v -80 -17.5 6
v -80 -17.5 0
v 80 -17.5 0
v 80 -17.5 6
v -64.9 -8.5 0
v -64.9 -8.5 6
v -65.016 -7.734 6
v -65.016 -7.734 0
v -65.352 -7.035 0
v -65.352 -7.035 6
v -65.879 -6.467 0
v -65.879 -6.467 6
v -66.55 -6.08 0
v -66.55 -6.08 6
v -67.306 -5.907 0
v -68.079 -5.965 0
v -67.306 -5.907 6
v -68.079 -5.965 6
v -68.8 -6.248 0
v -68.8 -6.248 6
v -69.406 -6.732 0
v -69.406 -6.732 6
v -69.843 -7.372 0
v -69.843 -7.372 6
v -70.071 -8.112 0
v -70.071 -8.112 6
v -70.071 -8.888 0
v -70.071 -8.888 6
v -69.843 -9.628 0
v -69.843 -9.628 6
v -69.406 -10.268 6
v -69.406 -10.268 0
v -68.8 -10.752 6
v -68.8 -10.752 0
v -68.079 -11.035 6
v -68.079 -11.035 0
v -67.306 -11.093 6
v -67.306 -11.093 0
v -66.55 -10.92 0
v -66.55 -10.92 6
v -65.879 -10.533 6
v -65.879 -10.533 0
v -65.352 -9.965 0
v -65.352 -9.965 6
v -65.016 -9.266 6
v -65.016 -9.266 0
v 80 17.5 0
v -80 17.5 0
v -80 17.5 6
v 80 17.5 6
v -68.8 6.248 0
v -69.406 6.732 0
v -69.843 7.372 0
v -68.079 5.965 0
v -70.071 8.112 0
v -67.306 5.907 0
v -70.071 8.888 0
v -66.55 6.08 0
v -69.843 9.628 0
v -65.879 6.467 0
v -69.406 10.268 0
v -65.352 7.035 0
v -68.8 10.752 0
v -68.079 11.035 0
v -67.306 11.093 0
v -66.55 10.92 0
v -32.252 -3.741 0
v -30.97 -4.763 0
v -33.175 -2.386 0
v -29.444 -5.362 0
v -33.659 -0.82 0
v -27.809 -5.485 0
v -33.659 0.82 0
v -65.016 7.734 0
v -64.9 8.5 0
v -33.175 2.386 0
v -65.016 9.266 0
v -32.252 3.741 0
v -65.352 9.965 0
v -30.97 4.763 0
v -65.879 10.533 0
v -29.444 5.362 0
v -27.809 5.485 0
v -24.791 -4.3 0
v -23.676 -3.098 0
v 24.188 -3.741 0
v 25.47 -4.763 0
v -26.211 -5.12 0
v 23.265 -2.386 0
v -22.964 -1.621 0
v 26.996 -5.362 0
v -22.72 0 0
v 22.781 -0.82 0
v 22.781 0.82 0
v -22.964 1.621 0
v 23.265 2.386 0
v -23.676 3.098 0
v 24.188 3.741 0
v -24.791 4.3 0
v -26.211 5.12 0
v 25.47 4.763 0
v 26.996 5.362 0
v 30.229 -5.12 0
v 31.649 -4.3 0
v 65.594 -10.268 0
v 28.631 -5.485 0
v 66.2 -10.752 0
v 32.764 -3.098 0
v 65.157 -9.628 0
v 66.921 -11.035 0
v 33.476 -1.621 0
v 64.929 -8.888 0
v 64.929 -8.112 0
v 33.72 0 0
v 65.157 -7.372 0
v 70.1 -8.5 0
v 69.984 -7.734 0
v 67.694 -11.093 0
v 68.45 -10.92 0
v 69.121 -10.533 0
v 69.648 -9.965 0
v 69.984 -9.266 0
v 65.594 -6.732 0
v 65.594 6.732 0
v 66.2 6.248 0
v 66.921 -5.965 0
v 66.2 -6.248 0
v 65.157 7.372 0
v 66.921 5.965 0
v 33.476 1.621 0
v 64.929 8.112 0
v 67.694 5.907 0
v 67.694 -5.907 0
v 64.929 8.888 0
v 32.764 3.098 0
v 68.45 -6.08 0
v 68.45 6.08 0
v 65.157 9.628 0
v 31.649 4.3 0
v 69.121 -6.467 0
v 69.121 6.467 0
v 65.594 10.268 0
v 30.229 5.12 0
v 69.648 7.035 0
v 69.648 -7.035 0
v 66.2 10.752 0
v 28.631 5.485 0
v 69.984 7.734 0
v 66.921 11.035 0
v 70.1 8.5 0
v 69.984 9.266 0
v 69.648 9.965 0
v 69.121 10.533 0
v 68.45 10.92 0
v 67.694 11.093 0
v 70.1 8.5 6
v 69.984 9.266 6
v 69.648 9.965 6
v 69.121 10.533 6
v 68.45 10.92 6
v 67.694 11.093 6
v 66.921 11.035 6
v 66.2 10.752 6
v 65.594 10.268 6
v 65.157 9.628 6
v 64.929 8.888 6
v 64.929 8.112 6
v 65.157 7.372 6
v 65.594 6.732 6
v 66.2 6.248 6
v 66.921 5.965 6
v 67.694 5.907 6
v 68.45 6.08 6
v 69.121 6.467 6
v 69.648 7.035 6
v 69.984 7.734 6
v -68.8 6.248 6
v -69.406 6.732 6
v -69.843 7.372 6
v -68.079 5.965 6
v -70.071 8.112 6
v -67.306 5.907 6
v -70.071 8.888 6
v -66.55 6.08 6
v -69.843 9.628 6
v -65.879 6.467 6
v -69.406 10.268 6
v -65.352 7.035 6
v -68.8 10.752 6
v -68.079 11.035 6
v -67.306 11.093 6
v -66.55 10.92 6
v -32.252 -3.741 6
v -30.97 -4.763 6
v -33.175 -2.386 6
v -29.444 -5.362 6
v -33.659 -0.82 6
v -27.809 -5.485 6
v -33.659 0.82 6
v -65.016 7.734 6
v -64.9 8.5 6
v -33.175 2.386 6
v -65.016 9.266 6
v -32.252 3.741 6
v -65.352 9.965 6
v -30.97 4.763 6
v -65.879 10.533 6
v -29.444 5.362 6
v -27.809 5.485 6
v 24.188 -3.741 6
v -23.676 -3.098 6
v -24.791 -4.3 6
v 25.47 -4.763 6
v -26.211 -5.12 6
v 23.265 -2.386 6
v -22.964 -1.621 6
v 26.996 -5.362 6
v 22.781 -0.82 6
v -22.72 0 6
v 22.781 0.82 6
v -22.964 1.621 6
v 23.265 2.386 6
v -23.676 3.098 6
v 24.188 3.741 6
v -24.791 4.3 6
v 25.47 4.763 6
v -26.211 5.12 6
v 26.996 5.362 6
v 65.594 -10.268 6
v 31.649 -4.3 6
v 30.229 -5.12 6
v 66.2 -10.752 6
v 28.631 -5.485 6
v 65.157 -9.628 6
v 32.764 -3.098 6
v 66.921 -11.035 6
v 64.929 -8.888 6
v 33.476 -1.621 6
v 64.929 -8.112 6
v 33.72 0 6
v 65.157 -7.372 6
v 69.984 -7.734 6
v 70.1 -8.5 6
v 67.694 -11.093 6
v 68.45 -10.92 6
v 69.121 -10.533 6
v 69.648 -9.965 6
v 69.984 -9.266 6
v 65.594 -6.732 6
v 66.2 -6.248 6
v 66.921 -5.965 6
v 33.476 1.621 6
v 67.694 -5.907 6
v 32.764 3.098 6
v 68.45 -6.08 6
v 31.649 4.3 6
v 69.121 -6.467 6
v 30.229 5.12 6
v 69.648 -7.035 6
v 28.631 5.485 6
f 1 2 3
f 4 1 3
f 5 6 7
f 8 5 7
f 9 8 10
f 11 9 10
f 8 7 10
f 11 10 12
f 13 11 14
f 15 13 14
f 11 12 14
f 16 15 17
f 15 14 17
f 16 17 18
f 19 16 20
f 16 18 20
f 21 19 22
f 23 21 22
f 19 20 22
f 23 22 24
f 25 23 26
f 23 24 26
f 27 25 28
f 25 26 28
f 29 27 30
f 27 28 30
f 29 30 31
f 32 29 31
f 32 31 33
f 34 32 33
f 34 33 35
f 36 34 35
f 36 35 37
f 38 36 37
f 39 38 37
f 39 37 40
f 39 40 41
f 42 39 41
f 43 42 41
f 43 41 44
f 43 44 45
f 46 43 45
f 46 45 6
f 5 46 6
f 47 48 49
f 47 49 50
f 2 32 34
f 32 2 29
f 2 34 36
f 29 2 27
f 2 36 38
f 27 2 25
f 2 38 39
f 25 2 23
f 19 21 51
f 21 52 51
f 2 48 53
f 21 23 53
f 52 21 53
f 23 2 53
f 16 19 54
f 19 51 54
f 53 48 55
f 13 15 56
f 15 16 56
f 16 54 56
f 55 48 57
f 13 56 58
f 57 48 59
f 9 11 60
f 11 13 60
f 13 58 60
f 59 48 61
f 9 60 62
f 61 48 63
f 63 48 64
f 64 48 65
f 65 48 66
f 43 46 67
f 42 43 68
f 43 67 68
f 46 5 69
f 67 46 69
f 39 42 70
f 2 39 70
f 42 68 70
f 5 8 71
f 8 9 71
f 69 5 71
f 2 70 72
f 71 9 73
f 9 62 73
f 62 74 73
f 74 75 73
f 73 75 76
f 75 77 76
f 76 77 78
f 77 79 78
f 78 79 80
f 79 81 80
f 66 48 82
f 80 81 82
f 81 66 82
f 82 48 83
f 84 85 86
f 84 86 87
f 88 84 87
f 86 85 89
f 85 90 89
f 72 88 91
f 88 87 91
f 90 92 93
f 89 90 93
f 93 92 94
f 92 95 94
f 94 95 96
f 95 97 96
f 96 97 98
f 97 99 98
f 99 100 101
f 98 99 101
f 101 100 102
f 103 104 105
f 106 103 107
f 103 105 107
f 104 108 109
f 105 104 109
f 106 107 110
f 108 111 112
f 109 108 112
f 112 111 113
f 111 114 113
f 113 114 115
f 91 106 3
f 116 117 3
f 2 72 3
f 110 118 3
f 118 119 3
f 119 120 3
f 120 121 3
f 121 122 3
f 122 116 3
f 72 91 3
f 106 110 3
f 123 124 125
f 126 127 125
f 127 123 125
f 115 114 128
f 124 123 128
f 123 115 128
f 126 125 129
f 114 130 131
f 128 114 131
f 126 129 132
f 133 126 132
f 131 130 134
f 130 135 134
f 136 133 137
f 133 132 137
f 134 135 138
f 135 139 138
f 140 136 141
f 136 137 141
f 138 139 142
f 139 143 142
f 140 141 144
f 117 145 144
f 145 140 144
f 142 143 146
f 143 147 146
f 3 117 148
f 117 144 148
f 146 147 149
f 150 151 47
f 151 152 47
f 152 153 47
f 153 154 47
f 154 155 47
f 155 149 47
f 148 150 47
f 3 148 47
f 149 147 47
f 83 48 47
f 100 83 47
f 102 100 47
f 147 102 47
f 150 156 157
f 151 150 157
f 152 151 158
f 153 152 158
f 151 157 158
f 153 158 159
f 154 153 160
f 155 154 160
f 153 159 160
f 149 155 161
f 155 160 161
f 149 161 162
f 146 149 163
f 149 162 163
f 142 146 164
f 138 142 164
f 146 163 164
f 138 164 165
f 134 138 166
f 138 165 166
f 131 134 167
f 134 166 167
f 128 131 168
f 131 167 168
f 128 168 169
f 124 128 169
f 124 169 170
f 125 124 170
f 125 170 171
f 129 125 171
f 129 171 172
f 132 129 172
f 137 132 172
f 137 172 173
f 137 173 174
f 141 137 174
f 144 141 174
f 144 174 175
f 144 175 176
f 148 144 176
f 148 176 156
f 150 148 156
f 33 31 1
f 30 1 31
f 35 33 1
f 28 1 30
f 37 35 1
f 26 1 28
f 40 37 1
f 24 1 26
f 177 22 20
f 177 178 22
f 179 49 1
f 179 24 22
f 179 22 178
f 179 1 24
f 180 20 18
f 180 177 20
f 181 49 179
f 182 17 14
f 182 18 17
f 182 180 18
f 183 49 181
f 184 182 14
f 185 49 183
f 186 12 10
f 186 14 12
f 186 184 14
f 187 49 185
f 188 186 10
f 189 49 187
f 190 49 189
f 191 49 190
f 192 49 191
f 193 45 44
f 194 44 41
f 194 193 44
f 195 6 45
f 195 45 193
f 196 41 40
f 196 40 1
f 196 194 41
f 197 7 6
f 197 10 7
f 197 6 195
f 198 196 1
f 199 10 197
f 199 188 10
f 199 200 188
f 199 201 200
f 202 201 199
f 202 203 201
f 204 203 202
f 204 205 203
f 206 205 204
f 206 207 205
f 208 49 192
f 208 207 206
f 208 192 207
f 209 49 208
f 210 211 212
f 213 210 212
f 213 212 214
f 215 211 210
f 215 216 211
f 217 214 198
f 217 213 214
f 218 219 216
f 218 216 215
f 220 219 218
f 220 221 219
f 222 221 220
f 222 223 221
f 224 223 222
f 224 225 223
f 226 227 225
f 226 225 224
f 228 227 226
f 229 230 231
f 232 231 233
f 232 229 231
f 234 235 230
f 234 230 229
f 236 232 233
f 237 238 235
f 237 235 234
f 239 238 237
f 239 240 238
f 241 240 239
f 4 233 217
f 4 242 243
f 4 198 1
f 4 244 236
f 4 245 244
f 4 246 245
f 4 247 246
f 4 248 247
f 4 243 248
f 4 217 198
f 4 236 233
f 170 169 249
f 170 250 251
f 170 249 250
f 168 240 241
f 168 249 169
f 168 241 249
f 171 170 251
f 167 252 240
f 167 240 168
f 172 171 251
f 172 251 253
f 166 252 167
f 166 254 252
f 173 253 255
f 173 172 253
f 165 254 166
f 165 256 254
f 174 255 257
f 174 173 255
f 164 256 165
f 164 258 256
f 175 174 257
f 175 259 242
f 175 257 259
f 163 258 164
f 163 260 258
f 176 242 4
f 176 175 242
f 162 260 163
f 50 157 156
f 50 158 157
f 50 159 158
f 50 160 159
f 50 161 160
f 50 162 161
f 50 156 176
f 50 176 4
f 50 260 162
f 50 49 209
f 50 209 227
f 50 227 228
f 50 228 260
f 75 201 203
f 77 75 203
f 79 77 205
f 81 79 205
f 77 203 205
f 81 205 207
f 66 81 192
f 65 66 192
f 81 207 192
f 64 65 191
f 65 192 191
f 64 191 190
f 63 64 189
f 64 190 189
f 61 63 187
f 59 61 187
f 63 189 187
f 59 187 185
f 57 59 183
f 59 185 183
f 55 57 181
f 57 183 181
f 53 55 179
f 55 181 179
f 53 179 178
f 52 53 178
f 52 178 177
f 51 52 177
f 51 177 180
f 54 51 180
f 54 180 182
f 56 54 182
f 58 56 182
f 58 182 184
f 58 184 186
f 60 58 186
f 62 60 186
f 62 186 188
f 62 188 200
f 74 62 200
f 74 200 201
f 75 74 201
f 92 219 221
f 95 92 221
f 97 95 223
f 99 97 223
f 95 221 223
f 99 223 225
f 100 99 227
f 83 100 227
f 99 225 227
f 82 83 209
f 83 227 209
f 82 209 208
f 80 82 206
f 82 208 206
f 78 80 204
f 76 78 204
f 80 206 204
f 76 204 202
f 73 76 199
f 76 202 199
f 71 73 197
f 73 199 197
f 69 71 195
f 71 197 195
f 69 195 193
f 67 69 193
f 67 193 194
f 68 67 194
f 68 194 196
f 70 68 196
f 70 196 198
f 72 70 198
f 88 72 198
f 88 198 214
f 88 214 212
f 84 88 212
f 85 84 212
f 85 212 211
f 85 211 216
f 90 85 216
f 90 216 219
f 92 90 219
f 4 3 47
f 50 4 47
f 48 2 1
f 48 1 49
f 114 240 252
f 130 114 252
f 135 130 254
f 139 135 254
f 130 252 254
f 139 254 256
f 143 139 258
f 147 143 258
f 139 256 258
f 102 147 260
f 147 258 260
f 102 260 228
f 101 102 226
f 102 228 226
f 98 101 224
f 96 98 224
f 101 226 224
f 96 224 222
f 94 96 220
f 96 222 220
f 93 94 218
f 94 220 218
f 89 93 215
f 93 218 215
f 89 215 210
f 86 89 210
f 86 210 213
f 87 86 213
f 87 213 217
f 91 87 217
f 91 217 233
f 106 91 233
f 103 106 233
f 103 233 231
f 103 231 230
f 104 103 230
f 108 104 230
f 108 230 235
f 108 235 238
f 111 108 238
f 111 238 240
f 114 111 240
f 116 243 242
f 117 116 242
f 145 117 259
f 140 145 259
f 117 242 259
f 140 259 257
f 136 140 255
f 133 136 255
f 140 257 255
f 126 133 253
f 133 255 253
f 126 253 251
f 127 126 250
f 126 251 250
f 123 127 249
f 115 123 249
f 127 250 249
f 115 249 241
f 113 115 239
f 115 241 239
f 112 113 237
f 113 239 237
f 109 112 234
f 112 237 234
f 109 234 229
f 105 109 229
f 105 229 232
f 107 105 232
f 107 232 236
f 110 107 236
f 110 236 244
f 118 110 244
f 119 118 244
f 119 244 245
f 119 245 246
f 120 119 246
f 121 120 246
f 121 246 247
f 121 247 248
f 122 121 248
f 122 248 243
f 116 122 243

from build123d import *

# Parameters (mm, degrees)
SKETCH1_W           = 160
SKETCH1_H           = 35
BOSS_EXTRUDE1_DEPTH = 6
CUT_EXTRUDE1_REACH  = 84.111
SKETCH2_R           = 2.6
CUT_EXTRUDE2_REACH  = 84.111
SKETCH3_R           = 5.5


with BuildPart() as part:
    # Sketch1 → Boss-Extrude1 (new body)
    with BuildSketch(Plane.XY):
        Rectangle(SKETCH1_W, SKETCH1_H)
    extrude(amount=BOSS_EXTRUDE1_DEPTH)

    # Sketch2 → Cut-Extrude1 (cut, up to next)
    with BuildSketch(Plane.XY.offset(6), mode=Mode.PRIVATE) as cut_extrude1_sk1:
        with Locations((67.5, 8.5)):
            Circle(SKETCH2_R)
    cut_extrude1_tool1 = extrude(cut_extrude1_sk1.sketch, amount=-CUT_EXTRUDE1_REACH, mode=Mode.PRIVATE) & part.part
    # Sketch2 → Cut-Extrude1 (cut, up to next)
    with BuildSketch(Plane.XY.offset(6), mode=Mode.PRIVATE) as cut_extrude1_sk2:
        with Locations((67.5, -8.5)):
            Circle(SKETCH2_R)
    cut_extrude1_tool2 = extrude(cut_extrude1_sk2.sketch, amount=-CUT_EXTRUDE1_REACH, mode=Mode.PRIVATE) & part.part
    # Sketch2 → Cut-Extrude1 (cut, up to next)
    with BuildSketch(Plane.XY.offset(6), mode=Mode.PRIVATE) as cut_extrude1_sk3:
        with Locations((-67.5, 8.5)):
            Circle(SKETCH2_R)
    cut_extrude1_tool3 = extrude(cut_extrude1_sk3.sketch, amount=-CUT_EXTRUDE1_REACH, mode=Mode.PRIVATE) & part.part
    # Sketch2 → Cut-Extrude1 (cut, up to next)
    with BuildSketch(Plane.XY.offset(6), mode=Mode.PRIVATE) as cut_extrude1_sk4:
        with Locations((-67.5, -8.5)):
            Circle(SKETCH2_R)
    cut_extrude1_tool4 = extrude(cut_extrude1_sk4.sketch, amount=-CUT_EXTRUDE1_REACH, mode=Mode.PRIVATE) & part.part
    add(cut_extrude1_tool1.solids().sort_by_distance((67.5, 8.5, 6))[0], mode=Mode.SUBTRACT)
    add(cut_extrude1_tool2.solids().sort_by_distance((67.5, -8.5, 6))[0], mode=Mode.SUBTRACT)
    add(cut_extrude1_tool3.solids().sort_by_distance((-67.5, 8.5, 6))[0], mode=Mode.SUBTRACT)
    add(cut_extrude1_tool4.solids().sort_by_distance((-67.5, -8.5, 6))[0], mode=Mode.SUBTRACT)

    # Sketch3 → Cut-Extrude2 (cut, up to next)
    with BuildSketch(Plane.XY.offset(6), mode=Mode.PRIVATE) as cut_extrude2_sk1:
        with Locations((28.22, 0)):
            Circle(SKETCH3_R)
    cut_extrude2_tool1 = extrude(cut_extrude2_sk1.sketch, amount=-CUT_EXTRUDE2_REACH, mode=Mode.PRIVATE) & part.part
    # Sketch3 → Cut-Extrude2 (cut, up to next)
    with BuildSketch(Plane.XY.offset(6), mode=Mode.PRIVATE) as cut_extrude2_sk2:
        with Locations((-28.22, 0)):
            Circle(SKETCH3_R)
    cut_extrude2_tool2 = extrude(cut_extrude2_sk2.sketch, amount=-CUT_EXTRUDE2_REACH, mode=Mode.PRIVATE) & part.part
    add(cut_extrude2_tool1.solids().sort_by_distance((28.22, 0, 6))[0], mode=Mode.SUBTRACT)
    add(cut_extrude2_tool2.solids().sort_by_distance((-28.22, 0, 6))[0], mode=Mode.SUBTRACT)


solid = part.part
